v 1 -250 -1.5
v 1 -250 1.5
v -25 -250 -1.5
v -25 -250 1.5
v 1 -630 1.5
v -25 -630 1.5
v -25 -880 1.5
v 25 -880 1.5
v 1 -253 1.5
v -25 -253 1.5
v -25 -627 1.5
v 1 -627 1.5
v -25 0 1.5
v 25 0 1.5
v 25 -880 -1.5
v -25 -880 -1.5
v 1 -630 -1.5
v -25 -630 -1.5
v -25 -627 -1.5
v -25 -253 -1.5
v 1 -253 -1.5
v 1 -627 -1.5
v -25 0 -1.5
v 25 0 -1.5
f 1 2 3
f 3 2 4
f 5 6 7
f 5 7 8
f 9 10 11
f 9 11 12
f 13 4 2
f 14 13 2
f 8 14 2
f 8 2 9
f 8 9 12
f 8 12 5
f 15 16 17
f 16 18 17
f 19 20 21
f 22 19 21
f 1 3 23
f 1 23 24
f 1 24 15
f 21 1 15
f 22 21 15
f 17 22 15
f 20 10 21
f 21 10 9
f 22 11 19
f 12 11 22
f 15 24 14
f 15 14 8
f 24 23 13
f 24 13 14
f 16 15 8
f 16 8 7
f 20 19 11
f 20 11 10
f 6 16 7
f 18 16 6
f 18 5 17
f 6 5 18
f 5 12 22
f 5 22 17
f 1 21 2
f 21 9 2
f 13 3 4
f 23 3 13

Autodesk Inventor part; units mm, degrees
ref_plane "YZ Plane" through (0, 0, 0) normal (1, 0, 0) x (0, 1, 0)
ref_plane "XZ Plane" through (0, 0, 0) normal (0, 1, 0) x (-1, 0, 0)
ref_plane "XY Plane" through (0, 0, 0) normal (0, 0, 1) x (1, 0, 0)
sketch "Sketch1" plane through (0, 0, 0) normal (0, 0, 1) x (1, 0, 0)
  line L0 (-25, 0) -> (25, 0)
  line L1 (25, 0) -> (25, -880)
  line L2 (25, -880) -> (-25, -880)
  line L3 (-25, -880) -> (-25, 0)
  point P0 (0, 0)
  point P1 (0, 0)
  point P2 (-25, -1153.2713)
  dimension "d0" = 50
  dimension "d1" = 880
extrude "Plate1" add sketch "Sketch1" along normal mid plane 3
sketch "Sketch2" plane through (0, 0, 1.5) normal (0, 0, 1) x (1, 0, 0)
  line L0 (-25, -627) -> (1, -627)
  line L1 (1, -627) -> (1, -630)
  line L2 (1, -630) -> (-25, -630)
  line L3 (-25, -630) -> (-25, -627)
  line L4 (-25, -880) -> (-25, 0) projected
  line L5 (-25, -253) -> (1, -253)
  line L6 (1, -253) -> (1, -250)
  line L7 (1, -250) -> (-25, -250)
  line L8 (-25, -250) -> (-25, -253)
  point P0 (0, 0)
  point P1 (-25, -628.5)
  point P2 (-25, -440)
  point P3 (-25, -251.5)
  point P4 (-25, -440)
  point P5 (-25, -250)
  dimension "d15" = 188.5
  dimension "d16" = 3
  dimension "d17" = 26
  dimension "d18" = 188.5
  dimension "d19" = 26
  dimension "d20" = 3
extrude "Extrusion1" cut sketch "Sketch2" against normal through all
equation "\"d18\" = d15"
equation "\"d20\" = d16"
equation "\"d2\" = Thickness"
equation "\"BendReliefWidth\" = Thickness"
equation "\"BendReliefDepth\" = 0.5 * Thickness"
equation "\"CornerReliefSize\" = 4 * Thickness"
equation "\"MinimumRemnant\" = 2 * Thickness"
equation "\"TransitionRadius\" = BendRadius"
equation "\"JacobiRadiusSize\" = BendRadius"
equation "\"GapSize\" = Thickness"
equation "\"Thickness\" = 3"
equation "\"BendRadius\" = 5"
properties part number "MSC 605 rib cone exit back" material "Stainless Steel"
